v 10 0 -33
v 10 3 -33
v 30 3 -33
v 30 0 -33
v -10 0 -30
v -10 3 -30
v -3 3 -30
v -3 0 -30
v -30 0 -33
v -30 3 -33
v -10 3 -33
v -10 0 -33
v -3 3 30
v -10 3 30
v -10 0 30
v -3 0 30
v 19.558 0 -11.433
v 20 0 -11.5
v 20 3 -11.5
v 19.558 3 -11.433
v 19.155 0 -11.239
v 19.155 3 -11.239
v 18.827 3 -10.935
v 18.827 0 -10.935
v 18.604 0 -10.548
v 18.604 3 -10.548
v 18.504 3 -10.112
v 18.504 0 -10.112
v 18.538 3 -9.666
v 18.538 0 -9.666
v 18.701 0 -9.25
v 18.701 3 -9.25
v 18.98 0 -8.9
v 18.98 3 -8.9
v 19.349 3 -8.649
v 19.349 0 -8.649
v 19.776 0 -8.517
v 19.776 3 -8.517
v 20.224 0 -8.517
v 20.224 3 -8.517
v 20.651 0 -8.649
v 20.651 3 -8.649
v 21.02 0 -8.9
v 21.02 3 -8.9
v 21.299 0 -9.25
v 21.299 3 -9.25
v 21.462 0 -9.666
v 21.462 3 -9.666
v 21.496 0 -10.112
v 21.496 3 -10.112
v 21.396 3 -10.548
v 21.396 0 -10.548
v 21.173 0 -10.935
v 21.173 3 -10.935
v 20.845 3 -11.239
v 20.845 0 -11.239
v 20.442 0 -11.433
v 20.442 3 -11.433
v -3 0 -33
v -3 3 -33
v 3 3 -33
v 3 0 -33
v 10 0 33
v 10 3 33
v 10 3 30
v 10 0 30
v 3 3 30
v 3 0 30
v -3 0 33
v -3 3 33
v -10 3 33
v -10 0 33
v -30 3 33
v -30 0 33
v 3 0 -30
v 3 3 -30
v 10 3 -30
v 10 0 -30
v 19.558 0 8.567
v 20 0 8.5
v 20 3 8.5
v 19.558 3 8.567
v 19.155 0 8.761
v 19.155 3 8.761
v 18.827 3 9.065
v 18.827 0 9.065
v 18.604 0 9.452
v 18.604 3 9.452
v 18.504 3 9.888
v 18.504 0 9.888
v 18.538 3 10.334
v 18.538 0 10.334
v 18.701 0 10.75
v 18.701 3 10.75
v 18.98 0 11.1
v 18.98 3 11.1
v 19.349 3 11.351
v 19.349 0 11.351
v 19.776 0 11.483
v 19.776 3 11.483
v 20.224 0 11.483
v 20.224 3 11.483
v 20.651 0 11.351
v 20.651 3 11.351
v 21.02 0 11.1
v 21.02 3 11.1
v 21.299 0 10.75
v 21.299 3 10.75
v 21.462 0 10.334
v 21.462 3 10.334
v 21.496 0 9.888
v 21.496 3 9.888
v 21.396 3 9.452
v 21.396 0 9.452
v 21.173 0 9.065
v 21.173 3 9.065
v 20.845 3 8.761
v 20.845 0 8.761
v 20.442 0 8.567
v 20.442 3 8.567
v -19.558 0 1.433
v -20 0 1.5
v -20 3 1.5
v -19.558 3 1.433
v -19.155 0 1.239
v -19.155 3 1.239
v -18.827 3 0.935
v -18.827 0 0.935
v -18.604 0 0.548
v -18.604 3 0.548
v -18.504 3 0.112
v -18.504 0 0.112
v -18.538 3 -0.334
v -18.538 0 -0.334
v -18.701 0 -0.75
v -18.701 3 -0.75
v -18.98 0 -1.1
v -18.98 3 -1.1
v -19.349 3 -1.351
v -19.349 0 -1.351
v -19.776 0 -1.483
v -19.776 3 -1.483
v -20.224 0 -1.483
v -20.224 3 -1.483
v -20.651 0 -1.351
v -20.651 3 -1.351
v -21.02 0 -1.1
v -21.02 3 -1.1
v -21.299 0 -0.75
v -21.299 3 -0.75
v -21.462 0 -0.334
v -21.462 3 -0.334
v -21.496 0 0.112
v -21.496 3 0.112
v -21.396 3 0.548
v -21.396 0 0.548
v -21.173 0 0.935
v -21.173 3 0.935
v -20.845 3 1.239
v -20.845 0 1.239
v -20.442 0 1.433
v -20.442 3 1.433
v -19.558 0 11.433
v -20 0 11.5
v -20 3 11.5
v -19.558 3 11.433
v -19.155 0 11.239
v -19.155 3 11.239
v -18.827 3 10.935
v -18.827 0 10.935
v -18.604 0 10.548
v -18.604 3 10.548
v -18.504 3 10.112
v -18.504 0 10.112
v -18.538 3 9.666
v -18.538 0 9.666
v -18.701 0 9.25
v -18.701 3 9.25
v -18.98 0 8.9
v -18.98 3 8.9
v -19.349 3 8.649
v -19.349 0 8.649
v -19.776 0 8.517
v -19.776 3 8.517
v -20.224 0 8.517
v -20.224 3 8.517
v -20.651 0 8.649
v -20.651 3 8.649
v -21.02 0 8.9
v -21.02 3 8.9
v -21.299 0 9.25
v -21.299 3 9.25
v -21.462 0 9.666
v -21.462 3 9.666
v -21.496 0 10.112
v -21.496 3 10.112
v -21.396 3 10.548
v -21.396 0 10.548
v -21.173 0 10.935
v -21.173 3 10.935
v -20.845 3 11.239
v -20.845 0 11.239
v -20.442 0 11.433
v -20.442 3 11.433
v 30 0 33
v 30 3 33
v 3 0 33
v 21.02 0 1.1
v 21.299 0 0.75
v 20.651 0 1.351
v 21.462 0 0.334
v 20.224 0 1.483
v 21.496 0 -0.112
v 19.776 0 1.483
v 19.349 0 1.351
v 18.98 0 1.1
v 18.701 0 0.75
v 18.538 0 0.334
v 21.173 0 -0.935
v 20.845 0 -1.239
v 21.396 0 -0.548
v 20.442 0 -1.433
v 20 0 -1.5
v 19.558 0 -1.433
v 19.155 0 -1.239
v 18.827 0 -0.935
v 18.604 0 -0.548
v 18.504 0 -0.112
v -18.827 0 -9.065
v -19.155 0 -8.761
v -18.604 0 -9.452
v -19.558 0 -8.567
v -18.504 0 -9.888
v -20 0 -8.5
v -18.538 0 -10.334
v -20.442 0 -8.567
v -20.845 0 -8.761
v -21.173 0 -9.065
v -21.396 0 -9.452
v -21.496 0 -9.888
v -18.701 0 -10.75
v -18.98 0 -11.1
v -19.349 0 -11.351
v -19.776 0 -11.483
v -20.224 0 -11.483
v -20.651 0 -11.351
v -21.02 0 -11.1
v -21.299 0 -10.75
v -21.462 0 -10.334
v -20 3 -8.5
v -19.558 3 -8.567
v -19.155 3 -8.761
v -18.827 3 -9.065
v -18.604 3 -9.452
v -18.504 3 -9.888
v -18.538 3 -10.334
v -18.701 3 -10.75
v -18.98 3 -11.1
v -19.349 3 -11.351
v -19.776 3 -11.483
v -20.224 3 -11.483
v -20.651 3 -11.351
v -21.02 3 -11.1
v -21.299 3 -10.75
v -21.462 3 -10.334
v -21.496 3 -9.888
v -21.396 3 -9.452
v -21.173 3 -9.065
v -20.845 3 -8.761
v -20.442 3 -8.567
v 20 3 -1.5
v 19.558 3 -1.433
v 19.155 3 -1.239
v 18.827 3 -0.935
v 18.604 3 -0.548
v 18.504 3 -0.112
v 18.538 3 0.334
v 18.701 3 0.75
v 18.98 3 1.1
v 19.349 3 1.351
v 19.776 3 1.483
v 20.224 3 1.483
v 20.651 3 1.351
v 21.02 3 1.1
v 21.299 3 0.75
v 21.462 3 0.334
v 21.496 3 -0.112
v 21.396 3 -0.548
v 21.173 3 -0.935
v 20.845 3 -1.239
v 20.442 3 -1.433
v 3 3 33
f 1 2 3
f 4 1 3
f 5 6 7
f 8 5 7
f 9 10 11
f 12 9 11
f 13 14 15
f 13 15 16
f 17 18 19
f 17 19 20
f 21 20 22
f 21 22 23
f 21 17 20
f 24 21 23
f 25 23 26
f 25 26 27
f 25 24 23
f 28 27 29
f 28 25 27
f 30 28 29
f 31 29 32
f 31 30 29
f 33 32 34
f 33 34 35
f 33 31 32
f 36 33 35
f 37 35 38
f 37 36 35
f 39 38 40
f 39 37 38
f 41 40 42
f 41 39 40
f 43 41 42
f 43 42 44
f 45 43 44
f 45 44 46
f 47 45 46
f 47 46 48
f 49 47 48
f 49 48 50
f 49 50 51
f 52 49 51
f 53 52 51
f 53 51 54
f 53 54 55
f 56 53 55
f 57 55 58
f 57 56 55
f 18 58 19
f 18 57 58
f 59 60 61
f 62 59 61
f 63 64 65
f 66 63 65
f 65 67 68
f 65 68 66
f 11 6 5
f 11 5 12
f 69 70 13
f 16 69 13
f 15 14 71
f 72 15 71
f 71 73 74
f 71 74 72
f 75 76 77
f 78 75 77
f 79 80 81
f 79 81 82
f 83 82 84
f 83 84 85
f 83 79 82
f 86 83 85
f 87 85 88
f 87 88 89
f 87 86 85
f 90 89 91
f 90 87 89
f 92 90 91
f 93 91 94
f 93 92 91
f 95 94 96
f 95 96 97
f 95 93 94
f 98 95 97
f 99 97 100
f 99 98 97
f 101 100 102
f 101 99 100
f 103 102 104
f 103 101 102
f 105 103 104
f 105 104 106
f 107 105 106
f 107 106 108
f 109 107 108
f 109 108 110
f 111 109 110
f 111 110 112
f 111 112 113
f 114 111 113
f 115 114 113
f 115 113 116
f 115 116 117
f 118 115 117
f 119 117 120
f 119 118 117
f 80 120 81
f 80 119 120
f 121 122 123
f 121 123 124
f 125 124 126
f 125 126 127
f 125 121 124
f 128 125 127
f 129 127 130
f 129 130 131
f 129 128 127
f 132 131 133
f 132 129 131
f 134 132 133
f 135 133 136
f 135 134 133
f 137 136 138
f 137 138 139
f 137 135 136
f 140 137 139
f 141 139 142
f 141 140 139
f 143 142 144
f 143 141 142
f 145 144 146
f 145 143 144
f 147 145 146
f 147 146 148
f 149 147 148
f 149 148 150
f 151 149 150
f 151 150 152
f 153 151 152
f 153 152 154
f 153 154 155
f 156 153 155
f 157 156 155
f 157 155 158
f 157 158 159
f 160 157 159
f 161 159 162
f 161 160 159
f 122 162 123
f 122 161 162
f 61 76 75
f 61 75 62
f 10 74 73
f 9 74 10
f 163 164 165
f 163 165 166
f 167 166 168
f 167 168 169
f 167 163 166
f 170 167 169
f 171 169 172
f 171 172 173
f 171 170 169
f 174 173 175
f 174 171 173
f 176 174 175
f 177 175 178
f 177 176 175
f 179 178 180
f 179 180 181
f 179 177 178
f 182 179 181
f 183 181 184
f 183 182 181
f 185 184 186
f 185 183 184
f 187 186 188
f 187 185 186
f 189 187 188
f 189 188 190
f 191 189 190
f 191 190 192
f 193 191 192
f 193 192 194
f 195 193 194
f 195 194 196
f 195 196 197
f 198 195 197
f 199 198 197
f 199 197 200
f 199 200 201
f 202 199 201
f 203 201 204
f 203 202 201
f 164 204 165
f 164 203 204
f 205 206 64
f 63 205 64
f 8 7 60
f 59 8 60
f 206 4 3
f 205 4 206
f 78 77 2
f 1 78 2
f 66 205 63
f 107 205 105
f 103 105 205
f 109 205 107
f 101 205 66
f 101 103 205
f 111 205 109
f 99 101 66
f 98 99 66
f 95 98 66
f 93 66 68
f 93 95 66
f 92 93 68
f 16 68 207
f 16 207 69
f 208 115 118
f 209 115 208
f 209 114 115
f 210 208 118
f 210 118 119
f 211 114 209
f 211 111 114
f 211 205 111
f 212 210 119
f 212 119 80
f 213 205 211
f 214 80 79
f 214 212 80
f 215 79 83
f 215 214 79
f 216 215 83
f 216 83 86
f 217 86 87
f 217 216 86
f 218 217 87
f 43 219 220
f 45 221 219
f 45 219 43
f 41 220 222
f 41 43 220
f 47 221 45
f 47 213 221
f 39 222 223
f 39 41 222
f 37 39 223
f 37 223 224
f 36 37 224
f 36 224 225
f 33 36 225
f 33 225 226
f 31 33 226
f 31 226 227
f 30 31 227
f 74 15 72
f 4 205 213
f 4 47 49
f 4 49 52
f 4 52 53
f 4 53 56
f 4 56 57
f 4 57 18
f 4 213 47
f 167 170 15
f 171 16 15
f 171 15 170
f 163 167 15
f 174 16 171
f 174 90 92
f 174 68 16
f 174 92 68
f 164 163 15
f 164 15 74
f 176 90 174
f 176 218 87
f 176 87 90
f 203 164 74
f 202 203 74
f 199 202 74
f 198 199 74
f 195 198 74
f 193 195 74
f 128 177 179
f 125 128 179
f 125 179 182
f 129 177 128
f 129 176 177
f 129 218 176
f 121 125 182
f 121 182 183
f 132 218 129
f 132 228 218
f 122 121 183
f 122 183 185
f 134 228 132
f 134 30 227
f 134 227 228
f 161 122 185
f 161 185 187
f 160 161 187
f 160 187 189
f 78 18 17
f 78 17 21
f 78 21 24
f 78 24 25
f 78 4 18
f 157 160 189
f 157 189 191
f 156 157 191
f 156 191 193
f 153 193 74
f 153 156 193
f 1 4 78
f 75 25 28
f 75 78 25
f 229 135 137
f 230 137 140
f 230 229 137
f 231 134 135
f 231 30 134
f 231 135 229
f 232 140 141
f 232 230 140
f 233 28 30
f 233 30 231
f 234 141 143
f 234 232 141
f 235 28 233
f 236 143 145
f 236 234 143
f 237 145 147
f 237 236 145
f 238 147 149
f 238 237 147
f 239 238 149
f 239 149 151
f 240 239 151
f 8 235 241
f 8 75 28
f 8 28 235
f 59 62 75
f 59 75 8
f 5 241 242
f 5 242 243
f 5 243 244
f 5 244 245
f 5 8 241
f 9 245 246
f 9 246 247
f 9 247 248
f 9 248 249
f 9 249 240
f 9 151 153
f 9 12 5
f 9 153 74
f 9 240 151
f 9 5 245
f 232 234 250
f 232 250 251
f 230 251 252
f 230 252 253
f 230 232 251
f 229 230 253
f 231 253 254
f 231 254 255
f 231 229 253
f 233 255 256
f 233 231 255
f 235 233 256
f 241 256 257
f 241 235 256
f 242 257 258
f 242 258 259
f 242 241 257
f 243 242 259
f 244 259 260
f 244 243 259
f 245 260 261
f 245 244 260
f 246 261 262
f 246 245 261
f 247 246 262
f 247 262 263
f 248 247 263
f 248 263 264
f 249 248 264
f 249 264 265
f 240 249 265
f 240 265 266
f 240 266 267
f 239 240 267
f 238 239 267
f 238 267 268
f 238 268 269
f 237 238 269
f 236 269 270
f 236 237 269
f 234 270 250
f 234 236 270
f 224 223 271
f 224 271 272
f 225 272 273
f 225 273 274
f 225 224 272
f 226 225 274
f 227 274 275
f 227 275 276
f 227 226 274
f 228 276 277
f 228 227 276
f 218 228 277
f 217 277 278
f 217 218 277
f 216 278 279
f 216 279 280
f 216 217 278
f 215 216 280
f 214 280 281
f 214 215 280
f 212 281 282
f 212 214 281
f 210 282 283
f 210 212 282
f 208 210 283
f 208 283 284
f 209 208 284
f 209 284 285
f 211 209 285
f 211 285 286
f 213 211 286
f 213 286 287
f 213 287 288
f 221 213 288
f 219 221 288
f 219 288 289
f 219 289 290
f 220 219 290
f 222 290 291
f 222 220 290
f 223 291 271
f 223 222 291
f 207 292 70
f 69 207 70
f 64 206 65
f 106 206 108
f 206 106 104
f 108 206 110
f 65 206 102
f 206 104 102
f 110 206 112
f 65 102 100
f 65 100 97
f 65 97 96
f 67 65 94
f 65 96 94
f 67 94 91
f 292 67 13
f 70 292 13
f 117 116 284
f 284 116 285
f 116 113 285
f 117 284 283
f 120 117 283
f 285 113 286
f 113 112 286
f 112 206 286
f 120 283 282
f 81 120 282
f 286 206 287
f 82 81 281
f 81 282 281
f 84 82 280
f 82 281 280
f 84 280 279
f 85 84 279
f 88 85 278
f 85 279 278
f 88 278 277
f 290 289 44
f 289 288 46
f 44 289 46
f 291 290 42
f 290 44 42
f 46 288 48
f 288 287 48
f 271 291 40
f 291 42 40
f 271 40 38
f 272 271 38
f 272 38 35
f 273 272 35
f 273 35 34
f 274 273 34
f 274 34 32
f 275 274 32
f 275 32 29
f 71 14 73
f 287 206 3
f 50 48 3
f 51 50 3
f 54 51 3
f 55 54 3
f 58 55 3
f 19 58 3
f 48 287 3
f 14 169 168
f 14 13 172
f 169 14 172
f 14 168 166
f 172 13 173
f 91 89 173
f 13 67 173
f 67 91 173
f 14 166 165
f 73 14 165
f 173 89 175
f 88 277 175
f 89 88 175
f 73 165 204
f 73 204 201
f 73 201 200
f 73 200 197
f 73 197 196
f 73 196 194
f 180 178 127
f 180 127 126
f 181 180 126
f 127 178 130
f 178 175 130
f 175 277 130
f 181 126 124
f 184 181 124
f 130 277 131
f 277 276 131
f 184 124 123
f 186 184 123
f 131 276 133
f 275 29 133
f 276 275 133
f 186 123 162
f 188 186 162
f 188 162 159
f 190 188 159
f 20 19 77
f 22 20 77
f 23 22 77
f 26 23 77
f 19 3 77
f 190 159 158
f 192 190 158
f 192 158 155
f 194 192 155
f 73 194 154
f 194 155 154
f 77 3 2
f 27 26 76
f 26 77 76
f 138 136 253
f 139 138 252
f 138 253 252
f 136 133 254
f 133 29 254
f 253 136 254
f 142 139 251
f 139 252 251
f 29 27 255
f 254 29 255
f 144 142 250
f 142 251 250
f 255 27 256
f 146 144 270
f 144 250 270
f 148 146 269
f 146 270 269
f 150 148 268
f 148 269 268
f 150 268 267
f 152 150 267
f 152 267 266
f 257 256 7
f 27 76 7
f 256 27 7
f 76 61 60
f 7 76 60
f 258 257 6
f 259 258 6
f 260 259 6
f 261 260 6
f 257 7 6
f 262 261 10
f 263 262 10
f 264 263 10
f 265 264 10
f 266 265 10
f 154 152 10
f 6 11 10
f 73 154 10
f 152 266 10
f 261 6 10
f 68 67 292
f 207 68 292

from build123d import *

# Parameters (mm, degrees)
SKETCH_1_R          = 1.5
EXTRUDE_1_DEPTH     = 3
SKETCH_2_W          = 20
SKETCH_2_H          = 3
SKETCH_2_W_2        = 7
SKETCH_2_W_3        = 6
CUT_EXTRUDE_1_DEPTH = 3


with BuildPart() as part:
    # 草图1 → 凸台-拉伸1 (new body)
    with BuildSketch(Plane(origin=(0, 0, 0), x_dir=(1, 0, 0), z_dir=(0, 1, 0))):
        Polygon((-3, 36), (3, 36), (3, 33), (10, 33), (10, 36), (30, 36), (30, -36), (10, -36), (10, -33), (3, -33), (3, -36), (-3, -36), (-3, -33), (-10, -33), (-10, -36), (-30, -36), (-30, 36), (-10, 36), (-10, 33), (-3, 33), align=None)
        with Locations(Location((-20, 0, 0), (0, 0, 270))):
            Circle(SKETCH_1_R, mode=Mode.SUBTRACT)
        with Locations(Location((-20, 10, 0), (0, 0, 270))):
            Circle(SKETCH_1_R, mode=Mode.SUBTRACT)
        with Locations(Location((-20, -10, 0), (0, 0, 270))):
            Circle(SKETCH_1_R, mode=Mode.SUBTRACT)
        with Locations(Location((20, -10, 0), (0, 0, 90))):
            Circle(SKETCH_1_R, mode=Mode.SUBTRACT)
        with Locations(Location((20, 0, 0), (0, 0, 90))):
            Circle(SKETCH_1_R, mode=Mode.SUBTRACT)
        with Locations(Location((20, 10, 0), (0, 0, 90))):
            Circle(SKETCH_1_R, mode=Mode.SUBTRACT)
    extrude(amount=EXTRUDE_1_DEPTH)

    # 草图2 → 切除-拉伸1 (cut)
    with BuildSketch(Plane(origin=(0, 3, 0), x_dir=(1, 0, 0), z_dir=(0, 1, 0))):
        Polygon((10, -36), (10, -33), (3, -33), (3, -36), (-3, -36), (-3, -33), (-10, -33), (-10, -36), (-30, -36), (-30, -51.145267559), (30, -51.145267559), (30, -36), align=None)
        with Locations((20, -34.5)):
            Rectangle(SKETCH_2_W, SKETCH_2_H)
        with Locations((6.5, -31.5)):
            Rectangle(SKETCH_2_W_2, SKETCH_2_H)
        with Locations((0, -34.5)):
            Rectangle(SKETCH_2_W_3, SKETCH_2_H)
        with Locations((-6.5, -31.5)):
            Rectangle(SKETCH_2_W_2, SKETCH_2_H)
        with Locations((-20, -34.5)):
            Rectangle(SKETCH_2_W, SKETCH_2_H)
        with Locations((-20, 34.5)):
            Rectangle(SKETCH_2_W, SKETCH_2_H)
        with Locations((-6.5, 31.5)):
            Rectangle(SKETCH_2_W_2, SKETCH_2_H)
        with Locations((0, 34.5)):
            Rectangle(SKETCH_2_W_3, SKETCH_2_H)
        with Locations((6.5, 31.5)):
            Rectangle(SKETCH_2_W_2, SKETCH_2_H)
        with Locations((20, 34.5)):
            Rectangle(SKETCH_2_W, SKETCH_2_H)
    extrude(amount=-CUT_EXTRUDE_1_DEPTH, mode=Mode.SUBTRACT)


solid = part.part
